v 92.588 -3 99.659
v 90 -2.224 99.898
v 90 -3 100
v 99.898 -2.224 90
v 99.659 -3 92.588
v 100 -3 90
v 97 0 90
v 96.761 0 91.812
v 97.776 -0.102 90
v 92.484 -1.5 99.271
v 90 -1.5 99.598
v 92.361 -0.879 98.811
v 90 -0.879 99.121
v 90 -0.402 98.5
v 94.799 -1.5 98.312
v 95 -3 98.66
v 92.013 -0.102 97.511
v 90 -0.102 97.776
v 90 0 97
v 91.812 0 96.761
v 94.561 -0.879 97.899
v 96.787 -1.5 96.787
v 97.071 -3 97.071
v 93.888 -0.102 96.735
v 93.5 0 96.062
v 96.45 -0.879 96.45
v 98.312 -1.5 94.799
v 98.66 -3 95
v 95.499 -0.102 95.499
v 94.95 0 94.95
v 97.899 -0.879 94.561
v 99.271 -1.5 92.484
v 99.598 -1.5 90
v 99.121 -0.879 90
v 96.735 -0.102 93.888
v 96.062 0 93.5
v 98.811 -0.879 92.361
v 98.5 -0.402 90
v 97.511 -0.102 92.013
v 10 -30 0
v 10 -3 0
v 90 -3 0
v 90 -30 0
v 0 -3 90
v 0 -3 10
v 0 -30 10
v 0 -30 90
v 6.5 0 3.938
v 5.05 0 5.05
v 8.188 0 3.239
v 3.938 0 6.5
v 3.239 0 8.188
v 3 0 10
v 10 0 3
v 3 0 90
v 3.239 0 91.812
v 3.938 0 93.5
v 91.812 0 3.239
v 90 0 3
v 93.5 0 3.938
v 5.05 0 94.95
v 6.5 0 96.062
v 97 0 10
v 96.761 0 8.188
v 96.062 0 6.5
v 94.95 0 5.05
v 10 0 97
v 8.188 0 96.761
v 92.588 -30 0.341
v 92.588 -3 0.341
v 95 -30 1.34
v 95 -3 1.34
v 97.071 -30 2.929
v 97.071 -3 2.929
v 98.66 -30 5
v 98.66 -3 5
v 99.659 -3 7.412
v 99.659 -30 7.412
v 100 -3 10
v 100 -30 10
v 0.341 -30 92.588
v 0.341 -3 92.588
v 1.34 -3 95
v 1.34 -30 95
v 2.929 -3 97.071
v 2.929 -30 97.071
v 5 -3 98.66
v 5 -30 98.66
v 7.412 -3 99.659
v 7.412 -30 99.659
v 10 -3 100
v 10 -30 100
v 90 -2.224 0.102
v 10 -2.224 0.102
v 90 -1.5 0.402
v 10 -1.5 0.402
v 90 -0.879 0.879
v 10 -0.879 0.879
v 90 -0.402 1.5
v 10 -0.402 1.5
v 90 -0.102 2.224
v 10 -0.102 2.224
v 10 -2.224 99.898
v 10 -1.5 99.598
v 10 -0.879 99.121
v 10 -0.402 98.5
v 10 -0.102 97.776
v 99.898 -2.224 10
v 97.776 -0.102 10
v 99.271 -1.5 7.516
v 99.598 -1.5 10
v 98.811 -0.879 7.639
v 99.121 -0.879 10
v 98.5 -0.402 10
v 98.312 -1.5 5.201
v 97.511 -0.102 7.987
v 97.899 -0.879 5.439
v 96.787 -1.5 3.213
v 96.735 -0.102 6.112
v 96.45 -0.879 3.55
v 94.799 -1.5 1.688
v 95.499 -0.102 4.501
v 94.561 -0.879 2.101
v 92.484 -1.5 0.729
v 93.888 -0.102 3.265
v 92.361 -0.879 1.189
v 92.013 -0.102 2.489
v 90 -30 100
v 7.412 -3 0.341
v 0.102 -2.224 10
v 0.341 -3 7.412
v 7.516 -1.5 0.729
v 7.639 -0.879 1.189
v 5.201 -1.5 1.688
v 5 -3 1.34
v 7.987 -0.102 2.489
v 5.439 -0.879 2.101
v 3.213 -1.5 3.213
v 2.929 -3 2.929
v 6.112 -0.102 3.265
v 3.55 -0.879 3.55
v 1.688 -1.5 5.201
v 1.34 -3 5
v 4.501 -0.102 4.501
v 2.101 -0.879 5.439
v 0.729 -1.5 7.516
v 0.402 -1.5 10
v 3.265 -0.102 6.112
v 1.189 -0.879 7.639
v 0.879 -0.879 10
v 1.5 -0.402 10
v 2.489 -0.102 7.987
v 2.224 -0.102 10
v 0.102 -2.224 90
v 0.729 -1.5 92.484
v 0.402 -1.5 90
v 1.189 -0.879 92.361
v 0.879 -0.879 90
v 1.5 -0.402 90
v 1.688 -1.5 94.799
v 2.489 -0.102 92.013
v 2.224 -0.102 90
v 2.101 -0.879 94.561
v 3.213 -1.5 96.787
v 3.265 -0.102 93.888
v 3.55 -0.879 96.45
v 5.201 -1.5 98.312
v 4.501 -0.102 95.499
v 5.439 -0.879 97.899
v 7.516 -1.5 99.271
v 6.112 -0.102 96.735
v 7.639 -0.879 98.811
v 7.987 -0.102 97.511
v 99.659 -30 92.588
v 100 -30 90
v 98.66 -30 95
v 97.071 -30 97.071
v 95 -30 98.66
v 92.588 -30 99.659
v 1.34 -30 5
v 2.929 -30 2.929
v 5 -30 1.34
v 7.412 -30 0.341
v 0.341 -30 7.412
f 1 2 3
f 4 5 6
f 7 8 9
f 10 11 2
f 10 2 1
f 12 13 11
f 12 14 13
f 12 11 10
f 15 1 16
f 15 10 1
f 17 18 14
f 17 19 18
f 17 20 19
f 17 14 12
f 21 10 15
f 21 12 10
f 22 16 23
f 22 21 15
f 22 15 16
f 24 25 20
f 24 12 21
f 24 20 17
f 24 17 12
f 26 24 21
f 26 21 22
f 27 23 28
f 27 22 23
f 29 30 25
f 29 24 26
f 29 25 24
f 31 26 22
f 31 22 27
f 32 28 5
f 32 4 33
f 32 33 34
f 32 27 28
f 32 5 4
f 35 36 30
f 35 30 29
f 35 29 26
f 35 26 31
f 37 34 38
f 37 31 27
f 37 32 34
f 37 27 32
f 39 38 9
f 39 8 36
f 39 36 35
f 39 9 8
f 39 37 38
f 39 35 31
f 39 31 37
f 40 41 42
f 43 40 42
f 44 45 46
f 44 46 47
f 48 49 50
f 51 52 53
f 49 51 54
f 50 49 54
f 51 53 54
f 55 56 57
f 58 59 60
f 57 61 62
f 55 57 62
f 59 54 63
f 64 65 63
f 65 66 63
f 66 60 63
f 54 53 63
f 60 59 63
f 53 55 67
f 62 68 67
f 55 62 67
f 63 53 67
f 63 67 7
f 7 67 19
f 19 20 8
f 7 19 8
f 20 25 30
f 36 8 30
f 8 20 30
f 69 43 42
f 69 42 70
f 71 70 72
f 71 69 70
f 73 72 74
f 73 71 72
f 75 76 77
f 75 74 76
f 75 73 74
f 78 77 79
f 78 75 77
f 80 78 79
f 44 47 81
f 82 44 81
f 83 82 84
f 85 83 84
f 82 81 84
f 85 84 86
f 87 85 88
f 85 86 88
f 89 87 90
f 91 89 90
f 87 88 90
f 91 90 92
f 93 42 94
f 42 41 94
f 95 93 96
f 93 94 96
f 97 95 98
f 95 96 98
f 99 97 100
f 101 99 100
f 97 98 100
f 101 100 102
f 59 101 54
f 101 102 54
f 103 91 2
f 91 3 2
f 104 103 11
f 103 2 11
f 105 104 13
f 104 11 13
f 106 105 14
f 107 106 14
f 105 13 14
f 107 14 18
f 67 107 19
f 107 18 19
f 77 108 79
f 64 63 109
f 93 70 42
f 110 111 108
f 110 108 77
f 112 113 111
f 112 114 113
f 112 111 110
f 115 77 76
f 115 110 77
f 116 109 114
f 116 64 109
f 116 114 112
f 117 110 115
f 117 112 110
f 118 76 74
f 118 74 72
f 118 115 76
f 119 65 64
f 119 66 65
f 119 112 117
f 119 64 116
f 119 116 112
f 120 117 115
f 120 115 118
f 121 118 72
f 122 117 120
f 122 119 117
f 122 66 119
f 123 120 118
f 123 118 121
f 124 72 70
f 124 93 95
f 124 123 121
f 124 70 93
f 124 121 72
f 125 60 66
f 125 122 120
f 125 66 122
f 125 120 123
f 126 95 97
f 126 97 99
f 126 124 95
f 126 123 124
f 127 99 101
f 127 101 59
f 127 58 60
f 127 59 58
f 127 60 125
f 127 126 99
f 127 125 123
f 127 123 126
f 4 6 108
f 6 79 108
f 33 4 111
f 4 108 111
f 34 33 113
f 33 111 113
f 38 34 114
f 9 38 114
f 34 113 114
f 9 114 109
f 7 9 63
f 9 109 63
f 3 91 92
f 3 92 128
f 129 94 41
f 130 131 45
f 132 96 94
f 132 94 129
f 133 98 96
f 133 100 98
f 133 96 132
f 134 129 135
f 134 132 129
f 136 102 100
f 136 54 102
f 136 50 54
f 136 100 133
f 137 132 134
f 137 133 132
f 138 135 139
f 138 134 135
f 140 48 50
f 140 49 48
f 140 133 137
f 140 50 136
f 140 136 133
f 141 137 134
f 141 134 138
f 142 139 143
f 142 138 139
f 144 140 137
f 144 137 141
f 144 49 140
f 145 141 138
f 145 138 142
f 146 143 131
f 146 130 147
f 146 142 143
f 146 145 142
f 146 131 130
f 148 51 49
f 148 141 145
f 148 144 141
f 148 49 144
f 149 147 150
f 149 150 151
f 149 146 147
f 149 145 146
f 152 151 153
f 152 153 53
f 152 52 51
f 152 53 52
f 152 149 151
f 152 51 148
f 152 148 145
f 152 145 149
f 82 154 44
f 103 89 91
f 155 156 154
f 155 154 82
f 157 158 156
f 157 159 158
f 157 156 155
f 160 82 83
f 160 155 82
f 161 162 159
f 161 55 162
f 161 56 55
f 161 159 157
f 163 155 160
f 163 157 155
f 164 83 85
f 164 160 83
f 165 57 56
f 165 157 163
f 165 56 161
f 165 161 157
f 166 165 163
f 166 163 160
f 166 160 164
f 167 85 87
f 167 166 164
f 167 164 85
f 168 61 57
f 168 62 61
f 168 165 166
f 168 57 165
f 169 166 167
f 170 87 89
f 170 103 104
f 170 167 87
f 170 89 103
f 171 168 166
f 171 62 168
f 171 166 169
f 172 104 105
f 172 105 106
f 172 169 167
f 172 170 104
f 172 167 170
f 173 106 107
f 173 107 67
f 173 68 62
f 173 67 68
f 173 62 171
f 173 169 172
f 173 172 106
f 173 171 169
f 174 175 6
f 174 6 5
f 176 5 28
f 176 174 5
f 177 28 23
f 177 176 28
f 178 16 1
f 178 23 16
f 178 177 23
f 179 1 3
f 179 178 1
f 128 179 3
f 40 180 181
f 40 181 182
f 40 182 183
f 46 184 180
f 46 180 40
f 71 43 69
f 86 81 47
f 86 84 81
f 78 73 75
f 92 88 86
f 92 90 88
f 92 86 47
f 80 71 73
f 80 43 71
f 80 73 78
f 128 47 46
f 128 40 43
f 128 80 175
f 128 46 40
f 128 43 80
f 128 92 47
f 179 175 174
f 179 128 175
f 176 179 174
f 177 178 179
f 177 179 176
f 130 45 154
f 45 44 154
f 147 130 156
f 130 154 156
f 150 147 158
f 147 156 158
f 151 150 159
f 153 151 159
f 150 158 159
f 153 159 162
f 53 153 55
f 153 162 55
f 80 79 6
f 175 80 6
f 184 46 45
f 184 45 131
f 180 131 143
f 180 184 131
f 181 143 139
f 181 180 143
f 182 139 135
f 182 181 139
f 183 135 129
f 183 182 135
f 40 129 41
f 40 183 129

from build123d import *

# Parameters (mm, degrees)
F0_W     = 100
F0_H     = 100
F1_DEPTH = 30
F2_R     = 10
F3_R     = 3


with BuildPart() as f1:
    # F0 (on Front) → F1 (new body)
    with BuildSketch(Plane.XZ):
        with Locations((50, 50)):
            Rectangle(F0_W, F0_H)
    extrude(amount=F1_DEPTH)

    # F2
    f2_edges = [f1.edges().sort_by_distance(p)[0] for p in [
        (0, -15, 100),
        (0, -15, 0),
        (100, -15, 0),
        (100, -15, 100),
    ]]
    fillet(f2_edges, radius=F2_R)

    # F3
    f3_edges = [f1.edges().sort_by_distance(p)[0] for p in [
        (0, 0, 50),
        (2.928932, 0, 97.071068),
        (2.928932, 0, 2.928932),
        (50, 0, 100),
        (50, 0, 0),
        (97.071068, 0, 97.071068),
        (97.071068, 0, 2.928932),
        (100, 0, 50),
    ]]
    fillet(f3_edges, radius=F3_R)


solid = f1.part
